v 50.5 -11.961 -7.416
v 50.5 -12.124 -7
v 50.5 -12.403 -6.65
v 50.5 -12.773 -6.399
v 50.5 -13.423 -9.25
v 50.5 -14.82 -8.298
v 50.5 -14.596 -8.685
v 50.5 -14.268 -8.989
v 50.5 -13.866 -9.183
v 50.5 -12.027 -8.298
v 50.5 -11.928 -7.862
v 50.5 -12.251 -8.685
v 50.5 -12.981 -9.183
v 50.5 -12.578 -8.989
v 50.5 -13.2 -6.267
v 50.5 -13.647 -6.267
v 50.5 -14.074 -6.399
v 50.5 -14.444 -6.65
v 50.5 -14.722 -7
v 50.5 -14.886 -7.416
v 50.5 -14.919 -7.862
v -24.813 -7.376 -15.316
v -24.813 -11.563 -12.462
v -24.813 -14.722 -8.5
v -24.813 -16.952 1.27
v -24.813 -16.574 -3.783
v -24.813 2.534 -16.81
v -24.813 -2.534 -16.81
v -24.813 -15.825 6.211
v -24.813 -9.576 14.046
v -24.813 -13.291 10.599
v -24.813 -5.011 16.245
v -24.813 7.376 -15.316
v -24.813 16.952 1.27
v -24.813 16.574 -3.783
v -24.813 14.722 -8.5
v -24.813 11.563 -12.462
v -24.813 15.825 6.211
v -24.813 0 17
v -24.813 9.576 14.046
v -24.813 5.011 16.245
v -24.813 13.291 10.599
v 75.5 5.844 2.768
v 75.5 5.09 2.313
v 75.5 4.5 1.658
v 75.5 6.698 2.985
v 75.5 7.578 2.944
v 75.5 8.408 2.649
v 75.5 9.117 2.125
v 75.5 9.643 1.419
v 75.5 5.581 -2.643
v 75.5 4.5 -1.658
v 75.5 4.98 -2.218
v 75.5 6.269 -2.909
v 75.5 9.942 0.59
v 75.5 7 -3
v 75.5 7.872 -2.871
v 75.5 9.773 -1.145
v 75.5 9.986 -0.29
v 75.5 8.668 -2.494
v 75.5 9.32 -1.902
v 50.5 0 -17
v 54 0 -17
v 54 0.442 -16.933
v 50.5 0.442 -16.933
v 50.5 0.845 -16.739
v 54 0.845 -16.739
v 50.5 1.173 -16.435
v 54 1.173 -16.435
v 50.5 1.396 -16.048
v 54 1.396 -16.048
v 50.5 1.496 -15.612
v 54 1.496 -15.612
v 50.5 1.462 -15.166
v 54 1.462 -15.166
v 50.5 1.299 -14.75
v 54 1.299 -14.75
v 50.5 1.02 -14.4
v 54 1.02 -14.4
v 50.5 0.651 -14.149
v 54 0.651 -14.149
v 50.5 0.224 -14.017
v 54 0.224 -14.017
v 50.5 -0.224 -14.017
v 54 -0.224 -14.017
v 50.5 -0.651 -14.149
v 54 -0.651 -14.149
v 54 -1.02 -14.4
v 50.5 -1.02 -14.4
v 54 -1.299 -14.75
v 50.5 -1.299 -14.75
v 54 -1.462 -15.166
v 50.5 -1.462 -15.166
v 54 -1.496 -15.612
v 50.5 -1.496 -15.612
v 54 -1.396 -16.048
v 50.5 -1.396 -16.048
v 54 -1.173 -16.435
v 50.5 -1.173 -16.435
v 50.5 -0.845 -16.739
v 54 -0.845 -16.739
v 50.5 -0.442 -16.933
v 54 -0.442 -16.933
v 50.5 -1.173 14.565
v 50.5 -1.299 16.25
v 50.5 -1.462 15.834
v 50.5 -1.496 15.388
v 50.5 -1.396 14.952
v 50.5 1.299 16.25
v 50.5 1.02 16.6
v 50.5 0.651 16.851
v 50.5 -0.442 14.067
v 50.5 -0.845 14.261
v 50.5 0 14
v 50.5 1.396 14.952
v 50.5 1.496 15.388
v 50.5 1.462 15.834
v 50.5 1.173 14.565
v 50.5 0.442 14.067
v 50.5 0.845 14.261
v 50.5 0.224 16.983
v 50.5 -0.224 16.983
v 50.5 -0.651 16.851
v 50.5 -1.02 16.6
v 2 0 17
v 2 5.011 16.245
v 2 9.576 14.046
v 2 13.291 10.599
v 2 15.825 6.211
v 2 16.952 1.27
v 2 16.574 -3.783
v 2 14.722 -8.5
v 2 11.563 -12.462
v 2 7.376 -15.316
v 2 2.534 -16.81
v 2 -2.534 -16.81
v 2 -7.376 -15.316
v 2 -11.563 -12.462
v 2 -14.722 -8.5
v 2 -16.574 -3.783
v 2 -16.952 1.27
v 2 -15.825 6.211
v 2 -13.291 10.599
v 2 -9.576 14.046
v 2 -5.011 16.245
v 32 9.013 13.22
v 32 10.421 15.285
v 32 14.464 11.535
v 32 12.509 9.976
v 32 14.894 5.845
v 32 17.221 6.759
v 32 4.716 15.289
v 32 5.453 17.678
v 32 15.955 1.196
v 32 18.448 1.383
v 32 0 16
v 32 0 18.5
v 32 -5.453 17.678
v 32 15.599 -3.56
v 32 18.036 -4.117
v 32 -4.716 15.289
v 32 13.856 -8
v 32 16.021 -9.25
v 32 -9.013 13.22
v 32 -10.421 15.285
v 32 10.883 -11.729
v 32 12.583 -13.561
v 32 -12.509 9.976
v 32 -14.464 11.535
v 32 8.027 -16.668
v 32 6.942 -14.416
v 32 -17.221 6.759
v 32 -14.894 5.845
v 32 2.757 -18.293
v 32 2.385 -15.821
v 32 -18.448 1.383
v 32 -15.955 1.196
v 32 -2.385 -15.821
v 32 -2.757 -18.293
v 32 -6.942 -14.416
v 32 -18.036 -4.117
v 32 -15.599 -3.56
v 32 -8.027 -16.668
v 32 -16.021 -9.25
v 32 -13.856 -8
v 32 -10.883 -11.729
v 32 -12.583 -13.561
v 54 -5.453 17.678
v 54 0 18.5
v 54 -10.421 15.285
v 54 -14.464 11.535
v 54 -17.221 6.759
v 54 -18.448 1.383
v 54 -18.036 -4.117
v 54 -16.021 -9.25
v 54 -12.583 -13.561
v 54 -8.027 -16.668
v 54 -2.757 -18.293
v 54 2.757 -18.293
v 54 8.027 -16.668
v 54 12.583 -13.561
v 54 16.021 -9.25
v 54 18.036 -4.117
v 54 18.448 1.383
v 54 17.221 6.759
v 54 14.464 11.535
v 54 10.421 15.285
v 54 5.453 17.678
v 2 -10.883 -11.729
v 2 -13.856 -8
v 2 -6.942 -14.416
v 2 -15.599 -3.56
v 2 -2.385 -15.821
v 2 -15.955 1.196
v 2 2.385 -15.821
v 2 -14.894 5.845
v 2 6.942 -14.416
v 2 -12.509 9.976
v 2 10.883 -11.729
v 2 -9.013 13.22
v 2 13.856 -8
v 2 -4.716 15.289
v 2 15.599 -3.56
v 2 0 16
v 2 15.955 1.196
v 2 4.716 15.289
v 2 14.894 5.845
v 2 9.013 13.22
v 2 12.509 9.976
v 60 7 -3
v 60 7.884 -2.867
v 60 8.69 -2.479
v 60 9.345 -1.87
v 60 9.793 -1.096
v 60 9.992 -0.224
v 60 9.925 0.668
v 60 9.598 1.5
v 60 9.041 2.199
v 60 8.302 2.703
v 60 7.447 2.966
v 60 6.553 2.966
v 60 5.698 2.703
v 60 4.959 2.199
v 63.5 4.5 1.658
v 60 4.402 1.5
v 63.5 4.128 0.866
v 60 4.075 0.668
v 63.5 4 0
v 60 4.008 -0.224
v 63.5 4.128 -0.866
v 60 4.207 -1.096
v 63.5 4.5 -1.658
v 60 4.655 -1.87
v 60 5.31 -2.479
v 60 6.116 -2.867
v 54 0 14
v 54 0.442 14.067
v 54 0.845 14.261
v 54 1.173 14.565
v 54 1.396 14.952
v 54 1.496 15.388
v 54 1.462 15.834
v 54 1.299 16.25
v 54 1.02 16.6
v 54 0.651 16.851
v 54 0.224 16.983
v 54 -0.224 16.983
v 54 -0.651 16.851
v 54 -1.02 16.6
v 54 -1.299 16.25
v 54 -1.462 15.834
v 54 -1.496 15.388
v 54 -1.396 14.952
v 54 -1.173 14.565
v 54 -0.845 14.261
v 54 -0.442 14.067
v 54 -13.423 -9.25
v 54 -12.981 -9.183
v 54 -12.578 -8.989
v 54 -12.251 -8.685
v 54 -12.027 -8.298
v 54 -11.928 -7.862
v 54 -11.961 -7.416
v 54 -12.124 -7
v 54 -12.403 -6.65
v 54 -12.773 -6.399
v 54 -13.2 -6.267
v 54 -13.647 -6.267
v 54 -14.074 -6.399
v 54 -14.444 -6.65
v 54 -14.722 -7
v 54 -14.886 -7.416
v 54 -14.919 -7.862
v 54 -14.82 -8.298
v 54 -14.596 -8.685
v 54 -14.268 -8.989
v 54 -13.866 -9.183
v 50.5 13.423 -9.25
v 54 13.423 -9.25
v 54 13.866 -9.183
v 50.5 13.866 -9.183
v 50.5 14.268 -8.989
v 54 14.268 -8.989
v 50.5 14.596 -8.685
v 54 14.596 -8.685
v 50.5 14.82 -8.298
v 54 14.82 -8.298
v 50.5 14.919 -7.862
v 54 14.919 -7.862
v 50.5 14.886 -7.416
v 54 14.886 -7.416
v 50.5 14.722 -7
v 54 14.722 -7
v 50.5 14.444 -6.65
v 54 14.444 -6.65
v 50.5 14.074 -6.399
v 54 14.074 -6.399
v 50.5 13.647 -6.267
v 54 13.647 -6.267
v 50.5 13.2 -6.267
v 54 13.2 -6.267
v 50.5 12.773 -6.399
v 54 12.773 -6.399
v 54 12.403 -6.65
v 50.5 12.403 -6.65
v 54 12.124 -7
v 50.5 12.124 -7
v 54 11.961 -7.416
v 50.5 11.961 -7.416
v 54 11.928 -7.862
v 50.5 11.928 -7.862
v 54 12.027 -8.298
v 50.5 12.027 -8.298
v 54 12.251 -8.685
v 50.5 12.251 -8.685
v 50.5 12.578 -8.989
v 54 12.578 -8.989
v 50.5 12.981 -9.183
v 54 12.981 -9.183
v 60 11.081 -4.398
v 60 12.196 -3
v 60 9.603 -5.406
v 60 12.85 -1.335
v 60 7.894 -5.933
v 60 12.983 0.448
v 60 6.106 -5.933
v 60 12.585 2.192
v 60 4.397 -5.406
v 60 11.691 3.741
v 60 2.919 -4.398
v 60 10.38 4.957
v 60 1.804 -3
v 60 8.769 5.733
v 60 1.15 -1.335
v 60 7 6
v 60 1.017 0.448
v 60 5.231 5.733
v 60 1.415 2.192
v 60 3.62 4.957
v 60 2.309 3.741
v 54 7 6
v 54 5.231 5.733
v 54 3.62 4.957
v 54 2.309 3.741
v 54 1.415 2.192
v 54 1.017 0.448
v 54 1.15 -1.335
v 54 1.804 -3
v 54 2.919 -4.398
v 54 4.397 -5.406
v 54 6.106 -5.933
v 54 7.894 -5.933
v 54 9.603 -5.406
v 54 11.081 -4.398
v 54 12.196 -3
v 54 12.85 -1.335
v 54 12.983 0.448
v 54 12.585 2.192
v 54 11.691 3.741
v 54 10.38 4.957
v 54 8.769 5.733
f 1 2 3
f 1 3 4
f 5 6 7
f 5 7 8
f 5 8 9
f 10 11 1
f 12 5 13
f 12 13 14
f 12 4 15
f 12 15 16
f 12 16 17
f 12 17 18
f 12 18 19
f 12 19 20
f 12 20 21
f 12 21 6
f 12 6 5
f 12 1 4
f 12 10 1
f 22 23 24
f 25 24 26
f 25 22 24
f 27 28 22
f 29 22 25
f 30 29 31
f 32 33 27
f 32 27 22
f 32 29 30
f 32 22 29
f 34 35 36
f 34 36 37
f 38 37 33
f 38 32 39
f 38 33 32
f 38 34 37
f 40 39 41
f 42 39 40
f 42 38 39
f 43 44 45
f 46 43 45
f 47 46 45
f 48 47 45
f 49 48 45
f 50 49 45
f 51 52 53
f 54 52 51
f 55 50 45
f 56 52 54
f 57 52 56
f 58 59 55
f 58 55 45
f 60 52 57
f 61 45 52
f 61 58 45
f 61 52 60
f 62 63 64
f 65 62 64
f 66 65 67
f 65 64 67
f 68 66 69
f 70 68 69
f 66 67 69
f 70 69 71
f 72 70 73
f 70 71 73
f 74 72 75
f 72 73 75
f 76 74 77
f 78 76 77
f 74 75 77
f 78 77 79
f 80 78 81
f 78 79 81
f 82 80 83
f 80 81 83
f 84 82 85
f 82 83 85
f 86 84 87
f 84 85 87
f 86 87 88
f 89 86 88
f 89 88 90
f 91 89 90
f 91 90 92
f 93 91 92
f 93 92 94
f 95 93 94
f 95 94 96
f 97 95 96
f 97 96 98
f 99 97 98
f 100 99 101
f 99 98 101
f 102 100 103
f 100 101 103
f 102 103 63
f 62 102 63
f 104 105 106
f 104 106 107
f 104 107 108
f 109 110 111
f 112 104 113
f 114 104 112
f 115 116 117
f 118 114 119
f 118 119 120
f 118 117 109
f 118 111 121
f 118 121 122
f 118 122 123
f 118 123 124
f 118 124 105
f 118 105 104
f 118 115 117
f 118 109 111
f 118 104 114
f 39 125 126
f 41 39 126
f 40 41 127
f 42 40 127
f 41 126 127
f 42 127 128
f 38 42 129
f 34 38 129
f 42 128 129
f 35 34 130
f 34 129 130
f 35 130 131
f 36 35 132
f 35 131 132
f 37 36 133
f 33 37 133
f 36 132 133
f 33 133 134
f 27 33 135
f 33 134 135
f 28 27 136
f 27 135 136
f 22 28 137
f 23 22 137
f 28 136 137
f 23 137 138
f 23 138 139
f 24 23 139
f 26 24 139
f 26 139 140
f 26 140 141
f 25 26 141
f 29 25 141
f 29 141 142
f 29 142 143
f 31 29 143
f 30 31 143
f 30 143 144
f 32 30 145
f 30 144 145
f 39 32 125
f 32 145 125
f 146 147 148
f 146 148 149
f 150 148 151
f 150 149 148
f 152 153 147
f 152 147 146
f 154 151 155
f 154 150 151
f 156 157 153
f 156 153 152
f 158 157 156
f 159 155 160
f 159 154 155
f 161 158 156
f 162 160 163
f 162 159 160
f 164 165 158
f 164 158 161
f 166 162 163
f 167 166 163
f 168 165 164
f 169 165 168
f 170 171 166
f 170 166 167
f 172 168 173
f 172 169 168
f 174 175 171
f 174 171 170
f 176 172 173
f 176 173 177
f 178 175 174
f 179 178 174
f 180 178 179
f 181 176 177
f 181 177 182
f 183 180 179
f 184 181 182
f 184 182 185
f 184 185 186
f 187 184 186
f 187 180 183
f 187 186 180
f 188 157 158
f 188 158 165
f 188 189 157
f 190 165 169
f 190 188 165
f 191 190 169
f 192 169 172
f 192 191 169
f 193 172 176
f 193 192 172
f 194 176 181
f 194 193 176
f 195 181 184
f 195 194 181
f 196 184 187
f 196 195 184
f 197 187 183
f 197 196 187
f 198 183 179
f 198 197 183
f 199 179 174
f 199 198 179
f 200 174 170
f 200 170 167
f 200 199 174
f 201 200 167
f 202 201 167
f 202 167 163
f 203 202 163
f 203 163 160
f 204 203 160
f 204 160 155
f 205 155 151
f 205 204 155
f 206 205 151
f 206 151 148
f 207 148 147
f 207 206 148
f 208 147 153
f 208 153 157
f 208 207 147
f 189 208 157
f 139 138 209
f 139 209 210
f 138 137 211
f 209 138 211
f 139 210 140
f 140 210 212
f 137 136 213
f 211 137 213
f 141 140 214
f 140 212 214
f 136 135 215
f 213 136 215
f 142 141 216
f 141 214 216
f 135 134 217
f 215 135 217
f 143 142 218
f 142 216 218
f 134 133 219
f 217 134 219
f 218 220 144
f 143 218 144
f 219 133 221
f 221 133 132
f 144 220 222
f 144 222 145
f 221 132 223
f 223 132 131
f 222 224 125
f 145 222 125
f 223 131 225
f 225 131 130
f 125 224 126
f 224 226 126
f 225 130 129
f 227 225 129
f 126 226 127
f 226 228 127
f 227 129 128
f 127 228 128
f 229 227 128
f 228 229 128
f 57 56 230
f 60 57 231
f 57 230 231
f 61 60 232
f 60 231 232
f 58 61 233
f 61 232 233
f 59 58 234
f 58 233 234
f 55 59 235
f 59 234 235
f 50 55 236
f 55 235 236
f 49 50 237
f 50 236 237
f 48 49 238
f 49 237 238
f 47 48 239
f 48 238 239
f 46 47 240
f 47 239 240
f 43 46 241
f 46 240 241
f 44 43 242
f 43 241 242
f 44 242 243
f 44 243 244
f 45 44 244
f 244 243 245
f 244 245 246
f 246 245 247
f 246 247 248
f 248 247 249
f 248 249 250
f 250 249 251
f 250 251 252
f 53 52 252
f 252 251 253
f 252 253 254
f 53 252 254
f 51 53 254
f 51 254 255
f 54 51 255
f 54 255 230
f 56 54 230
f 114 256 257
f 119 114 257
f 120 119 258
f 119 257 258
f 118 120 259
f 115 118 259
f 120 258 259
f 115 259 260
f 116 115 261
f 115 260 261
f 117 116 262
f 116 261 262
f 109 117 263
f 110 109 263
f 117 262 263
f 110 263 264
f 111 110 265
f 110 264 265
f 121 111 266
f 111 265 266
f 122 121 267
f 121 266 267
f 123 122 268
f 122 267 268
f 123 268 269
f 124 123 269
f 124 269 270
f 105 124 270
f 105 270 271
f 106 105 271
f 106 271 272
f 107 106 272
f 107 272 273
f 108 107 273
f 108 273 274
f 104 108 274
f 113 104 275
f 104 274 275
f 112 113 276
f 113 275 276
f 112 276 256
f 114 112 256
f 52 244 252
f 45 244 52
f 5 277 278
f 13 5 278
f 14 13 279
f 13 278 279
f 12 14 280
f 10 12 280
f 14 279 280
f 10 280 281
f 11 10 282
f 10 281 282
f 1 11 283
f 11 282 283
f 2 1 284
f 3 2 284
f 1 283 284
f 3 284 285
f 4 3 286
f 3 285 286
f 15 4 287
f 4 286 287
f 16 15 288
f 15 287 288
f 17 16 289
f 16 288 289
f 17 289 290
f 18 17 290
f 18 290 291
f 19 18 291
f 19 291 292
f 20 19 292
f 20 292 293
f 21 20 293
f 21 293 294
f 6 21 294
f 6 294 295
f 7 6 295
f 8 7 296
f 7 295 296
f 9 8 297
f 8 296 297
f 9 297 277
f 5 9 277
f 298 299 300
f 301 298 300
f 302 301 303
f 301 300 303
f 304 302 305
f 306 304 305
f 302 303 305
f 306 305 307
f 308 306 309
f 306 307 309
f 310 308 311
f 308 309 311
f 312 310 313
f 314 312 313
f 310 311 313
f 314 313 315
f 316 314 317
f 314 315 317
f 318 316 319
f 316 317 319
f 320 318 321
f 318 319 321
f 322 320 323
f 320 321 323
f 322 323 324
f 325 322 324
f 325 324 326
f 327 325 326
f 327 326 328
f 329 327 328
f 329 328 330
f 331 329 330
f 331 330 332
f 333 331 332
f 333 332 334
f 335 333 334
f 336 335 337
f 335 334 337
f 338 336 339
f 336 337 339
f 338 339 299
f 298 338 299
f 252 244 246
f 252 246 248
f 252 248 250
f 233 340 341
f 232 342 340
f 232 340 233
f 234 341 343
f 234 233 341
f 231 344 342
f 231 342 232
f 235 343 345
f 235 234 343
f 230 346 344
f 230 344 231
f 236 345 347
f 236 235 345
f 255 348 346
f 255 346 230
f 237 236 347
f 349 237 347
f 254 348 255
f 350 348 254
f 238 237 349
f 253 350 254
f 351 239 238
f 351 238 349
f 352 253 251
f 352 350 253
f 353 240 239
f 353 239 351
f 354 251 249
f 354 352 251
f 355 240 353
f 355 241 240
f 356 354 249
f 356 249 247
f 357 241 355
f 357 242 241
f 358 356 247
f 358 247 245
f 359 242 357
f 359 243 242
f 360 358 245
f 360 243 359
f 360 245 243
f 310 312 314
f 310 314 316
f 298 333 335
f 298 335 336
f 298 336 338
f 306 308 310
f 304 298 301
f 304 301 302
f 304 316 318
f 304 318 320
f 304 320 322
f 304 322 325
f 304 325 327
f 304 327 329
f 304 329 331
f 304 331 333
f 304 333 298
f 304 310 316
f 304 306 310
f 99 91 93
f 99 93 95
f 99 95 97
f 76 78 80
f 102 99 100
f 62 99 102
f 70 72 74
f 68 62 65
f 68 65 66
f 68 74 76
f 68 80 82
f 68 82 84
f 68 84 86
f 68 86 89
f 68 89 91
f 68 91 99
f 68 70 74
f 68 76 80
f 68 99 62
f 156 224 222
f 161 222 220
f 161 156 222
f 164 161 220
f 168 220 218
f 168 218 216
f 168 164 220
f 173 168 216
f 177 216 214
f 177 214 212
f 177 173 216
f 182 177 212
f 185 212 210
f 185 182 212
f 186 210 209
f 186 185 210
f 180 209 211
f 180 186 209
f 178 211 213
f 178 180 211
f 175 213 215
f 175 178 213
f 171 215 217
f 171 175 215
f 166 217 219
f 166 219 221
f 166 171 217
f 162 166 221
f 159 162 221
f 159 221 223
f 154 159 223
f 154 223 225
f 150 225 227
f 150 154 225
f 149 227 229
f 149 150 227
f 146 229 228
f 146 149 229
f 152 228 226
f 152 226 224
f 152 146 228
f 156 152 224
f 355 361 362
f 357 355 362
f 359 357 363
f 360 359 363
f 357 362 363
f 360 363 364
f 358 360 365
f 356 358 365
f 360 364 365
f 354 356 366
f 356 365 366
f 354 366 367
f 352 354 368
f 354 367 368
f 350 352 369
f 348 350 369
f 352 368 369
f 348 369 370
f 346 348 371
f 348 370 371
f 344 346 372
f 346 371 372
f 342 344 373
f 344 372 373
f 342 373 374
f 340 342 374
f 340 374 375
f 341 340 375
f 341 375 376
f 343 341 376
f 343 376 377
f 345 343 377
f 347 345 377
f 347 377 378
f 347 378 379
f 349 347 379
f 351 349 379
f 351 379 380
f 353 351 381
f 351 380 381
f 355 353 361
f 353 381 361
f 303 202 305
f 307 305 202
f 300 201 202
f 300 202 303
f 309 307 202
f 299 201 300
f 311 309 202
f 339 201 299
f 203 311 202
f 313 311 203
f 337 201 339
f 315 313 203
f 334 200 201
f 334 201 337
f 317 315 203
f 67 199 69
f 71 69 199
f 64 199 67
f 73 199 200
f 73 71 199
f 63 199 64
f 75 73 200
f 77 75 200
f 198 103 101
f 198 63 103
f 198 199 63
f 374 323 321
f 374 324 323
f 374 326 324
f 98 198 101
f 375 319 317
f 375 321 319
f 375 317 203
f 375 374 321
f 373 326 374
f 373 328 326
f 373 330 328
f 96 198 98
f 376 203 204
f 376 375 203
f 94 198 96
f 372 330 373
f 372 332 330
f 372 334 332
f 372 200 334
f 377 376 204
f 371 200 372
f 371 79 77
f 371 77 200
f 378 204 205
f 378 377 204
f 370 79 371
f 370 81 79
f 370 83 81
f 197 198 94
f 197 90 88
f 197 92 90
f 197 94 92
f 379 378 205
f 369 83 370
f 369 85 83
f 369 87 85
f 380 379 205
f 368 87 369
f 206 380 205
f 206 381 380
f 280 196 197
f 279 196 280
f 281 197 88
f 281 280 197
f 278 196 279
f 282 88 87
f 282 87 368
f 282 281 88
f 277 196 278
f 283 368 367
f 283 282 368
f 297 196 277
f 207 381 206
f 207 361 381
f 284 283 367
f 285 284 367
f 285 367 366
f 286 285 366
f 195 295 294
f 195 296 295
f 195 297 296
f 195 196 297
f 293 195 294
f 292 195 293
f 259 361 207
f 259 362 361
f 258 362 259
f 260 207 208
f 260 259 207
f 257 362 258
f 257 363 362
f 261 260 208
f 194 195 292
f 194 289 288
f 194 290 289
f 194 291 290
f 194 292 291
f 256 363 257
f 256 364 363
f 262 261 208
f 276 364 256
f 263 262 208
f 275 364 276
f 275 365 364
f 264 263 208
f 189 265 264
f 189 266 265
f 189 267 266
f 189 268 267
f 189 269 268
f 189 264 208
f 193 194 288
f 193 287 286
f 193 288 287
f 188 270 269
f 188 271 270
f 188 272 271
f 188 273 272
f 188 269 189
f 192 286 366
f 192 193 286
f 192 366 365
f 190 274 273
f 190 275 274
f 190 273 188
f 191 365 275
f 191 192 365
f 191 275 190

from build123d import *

# Parameters (mm, degrees)
ESQUISSE2_R             = 6
BOSS_EXTRU_1_DEPTH      = 6
ESQUISSE3_R             = 3
BOSS_EXTRU_2_DEPTH      = 15.5
ESQUISSE4_W             = 12
ESQUISSE4_H             = 0.5
ENL_V_MAT_EXTRU_1_DEPTH = 7.75
ESQUISSE5_R             = 1.5
ENL_V_MAT_EXTRU_2_DEPTH = 3.5
ESQUISSE6_W             = 3
ESQUISSE6_H             = 1
BOSS_EXTRU_3_DEPTH      = 4
ESQUISSE7_R             = 17
BOSS_EXTRU_4_DEPTH      = 26.813317369


with BuildPart() as part:
    # Esquisse1 → Révolution1 (revolve)
    with BuildSketch(Plane.XY, mode=Mode.PRIVATE) as r_volution1_sk:
        Polygon((0, 0), (0, 2), (2, 2), (2, 16), (32, 16), (32, 18.5), (54, 18.5), (54, 0), align=None)
    revolve(r_volution1_sk.sketch.rotate(Axis((0, 0, 0), (1, 0, 0)), 90), axis=Axis((0, 0, 0), (1, 0, 0)))

    # Esquisse2 → Boss.-Extru.1 (add)
    with BuildSketch(Plane(origin=(54, 0, 0), x_dir=(0, 0, -1), z_dir=(1, 0, 0))):
        with Locations(Location((0, 7, 0), (0, 0, 180))):
            Circle(ESQUISSE2_R)
    extrude(amount=BOSS_EXTRU_1_DEPTH)

    # Esquisse3 → Boss.-Extru.2 (add)
    with BuildSketch(Plane(origin=(60, 0, 0), x_dir=(0, 0, -1), z_dir=(1, 0, 0))):
        with Locations((0, 7)):
            Circle(ESQUISSE3_R)
    extrude(amount=BOSS_EXTRU_2_DEPTH)

    # Esquisse4 → Enlèv. mat.-Extru.1 (cut, symmetric)
    with BuildSketch(Plane.XY):
        with Locations((69.5, 4.25)):
            Rectangle(ESQUISSE4_W, ESQUISSE4_H)
    extrude(amount=ENL_V_MAT_EXTRU_1_DEPTH, both=True, mode=Mode.SUBTRACT)

    # Esquisse5 → Enlèv. mat.-Extru.2 (cut)
    with BuildSketch(Plane(origin=(54, 0, 0), x_dir=(0, 0, -1), z_dir=(1, 0, 0))):
        with Locations((15.5, 0)):
            Circle(ESQUISSE5_R)
        with Locations((7.75, 13.423393759)):
            Circle(ESQUISSE5_R)
        with Locations((7.75, -13.423393759)):
            Circle(ESQUISSE5_R)
        with Locations((-15.5, 0)):
            Circle(ESQUISSE5_R)
    extrude(amount=-ENL_V_MAT_EXTRU_2_DEPTH, mode=Mode.SUBTRACT)

    # Esquisse6 → Boss.-Extru.3 (add)
    with BuildSketch(Plane.ZY.offset(-2)):
        with Locations((0, 12.939057981)):
            Rectangle(ESQUISSE6_W, ESQUISSE6_H)
        with Locations((0, -12.939057981)):
            Rectangle(ESQUISSE6_W, ESQUISSE6_H)
    extrude(amount=BOSS_EXTRU_3_DEPTH)

    # Esquisse7 → Boss.-Extru.4 (add)
    with BuildSketch(Plane.ZY.offset(-2)):
        Circle(ESQUISSE7_R)
    extrude(amount=BOSS_EXTRU_4_DEPTH)


solid = part.part
